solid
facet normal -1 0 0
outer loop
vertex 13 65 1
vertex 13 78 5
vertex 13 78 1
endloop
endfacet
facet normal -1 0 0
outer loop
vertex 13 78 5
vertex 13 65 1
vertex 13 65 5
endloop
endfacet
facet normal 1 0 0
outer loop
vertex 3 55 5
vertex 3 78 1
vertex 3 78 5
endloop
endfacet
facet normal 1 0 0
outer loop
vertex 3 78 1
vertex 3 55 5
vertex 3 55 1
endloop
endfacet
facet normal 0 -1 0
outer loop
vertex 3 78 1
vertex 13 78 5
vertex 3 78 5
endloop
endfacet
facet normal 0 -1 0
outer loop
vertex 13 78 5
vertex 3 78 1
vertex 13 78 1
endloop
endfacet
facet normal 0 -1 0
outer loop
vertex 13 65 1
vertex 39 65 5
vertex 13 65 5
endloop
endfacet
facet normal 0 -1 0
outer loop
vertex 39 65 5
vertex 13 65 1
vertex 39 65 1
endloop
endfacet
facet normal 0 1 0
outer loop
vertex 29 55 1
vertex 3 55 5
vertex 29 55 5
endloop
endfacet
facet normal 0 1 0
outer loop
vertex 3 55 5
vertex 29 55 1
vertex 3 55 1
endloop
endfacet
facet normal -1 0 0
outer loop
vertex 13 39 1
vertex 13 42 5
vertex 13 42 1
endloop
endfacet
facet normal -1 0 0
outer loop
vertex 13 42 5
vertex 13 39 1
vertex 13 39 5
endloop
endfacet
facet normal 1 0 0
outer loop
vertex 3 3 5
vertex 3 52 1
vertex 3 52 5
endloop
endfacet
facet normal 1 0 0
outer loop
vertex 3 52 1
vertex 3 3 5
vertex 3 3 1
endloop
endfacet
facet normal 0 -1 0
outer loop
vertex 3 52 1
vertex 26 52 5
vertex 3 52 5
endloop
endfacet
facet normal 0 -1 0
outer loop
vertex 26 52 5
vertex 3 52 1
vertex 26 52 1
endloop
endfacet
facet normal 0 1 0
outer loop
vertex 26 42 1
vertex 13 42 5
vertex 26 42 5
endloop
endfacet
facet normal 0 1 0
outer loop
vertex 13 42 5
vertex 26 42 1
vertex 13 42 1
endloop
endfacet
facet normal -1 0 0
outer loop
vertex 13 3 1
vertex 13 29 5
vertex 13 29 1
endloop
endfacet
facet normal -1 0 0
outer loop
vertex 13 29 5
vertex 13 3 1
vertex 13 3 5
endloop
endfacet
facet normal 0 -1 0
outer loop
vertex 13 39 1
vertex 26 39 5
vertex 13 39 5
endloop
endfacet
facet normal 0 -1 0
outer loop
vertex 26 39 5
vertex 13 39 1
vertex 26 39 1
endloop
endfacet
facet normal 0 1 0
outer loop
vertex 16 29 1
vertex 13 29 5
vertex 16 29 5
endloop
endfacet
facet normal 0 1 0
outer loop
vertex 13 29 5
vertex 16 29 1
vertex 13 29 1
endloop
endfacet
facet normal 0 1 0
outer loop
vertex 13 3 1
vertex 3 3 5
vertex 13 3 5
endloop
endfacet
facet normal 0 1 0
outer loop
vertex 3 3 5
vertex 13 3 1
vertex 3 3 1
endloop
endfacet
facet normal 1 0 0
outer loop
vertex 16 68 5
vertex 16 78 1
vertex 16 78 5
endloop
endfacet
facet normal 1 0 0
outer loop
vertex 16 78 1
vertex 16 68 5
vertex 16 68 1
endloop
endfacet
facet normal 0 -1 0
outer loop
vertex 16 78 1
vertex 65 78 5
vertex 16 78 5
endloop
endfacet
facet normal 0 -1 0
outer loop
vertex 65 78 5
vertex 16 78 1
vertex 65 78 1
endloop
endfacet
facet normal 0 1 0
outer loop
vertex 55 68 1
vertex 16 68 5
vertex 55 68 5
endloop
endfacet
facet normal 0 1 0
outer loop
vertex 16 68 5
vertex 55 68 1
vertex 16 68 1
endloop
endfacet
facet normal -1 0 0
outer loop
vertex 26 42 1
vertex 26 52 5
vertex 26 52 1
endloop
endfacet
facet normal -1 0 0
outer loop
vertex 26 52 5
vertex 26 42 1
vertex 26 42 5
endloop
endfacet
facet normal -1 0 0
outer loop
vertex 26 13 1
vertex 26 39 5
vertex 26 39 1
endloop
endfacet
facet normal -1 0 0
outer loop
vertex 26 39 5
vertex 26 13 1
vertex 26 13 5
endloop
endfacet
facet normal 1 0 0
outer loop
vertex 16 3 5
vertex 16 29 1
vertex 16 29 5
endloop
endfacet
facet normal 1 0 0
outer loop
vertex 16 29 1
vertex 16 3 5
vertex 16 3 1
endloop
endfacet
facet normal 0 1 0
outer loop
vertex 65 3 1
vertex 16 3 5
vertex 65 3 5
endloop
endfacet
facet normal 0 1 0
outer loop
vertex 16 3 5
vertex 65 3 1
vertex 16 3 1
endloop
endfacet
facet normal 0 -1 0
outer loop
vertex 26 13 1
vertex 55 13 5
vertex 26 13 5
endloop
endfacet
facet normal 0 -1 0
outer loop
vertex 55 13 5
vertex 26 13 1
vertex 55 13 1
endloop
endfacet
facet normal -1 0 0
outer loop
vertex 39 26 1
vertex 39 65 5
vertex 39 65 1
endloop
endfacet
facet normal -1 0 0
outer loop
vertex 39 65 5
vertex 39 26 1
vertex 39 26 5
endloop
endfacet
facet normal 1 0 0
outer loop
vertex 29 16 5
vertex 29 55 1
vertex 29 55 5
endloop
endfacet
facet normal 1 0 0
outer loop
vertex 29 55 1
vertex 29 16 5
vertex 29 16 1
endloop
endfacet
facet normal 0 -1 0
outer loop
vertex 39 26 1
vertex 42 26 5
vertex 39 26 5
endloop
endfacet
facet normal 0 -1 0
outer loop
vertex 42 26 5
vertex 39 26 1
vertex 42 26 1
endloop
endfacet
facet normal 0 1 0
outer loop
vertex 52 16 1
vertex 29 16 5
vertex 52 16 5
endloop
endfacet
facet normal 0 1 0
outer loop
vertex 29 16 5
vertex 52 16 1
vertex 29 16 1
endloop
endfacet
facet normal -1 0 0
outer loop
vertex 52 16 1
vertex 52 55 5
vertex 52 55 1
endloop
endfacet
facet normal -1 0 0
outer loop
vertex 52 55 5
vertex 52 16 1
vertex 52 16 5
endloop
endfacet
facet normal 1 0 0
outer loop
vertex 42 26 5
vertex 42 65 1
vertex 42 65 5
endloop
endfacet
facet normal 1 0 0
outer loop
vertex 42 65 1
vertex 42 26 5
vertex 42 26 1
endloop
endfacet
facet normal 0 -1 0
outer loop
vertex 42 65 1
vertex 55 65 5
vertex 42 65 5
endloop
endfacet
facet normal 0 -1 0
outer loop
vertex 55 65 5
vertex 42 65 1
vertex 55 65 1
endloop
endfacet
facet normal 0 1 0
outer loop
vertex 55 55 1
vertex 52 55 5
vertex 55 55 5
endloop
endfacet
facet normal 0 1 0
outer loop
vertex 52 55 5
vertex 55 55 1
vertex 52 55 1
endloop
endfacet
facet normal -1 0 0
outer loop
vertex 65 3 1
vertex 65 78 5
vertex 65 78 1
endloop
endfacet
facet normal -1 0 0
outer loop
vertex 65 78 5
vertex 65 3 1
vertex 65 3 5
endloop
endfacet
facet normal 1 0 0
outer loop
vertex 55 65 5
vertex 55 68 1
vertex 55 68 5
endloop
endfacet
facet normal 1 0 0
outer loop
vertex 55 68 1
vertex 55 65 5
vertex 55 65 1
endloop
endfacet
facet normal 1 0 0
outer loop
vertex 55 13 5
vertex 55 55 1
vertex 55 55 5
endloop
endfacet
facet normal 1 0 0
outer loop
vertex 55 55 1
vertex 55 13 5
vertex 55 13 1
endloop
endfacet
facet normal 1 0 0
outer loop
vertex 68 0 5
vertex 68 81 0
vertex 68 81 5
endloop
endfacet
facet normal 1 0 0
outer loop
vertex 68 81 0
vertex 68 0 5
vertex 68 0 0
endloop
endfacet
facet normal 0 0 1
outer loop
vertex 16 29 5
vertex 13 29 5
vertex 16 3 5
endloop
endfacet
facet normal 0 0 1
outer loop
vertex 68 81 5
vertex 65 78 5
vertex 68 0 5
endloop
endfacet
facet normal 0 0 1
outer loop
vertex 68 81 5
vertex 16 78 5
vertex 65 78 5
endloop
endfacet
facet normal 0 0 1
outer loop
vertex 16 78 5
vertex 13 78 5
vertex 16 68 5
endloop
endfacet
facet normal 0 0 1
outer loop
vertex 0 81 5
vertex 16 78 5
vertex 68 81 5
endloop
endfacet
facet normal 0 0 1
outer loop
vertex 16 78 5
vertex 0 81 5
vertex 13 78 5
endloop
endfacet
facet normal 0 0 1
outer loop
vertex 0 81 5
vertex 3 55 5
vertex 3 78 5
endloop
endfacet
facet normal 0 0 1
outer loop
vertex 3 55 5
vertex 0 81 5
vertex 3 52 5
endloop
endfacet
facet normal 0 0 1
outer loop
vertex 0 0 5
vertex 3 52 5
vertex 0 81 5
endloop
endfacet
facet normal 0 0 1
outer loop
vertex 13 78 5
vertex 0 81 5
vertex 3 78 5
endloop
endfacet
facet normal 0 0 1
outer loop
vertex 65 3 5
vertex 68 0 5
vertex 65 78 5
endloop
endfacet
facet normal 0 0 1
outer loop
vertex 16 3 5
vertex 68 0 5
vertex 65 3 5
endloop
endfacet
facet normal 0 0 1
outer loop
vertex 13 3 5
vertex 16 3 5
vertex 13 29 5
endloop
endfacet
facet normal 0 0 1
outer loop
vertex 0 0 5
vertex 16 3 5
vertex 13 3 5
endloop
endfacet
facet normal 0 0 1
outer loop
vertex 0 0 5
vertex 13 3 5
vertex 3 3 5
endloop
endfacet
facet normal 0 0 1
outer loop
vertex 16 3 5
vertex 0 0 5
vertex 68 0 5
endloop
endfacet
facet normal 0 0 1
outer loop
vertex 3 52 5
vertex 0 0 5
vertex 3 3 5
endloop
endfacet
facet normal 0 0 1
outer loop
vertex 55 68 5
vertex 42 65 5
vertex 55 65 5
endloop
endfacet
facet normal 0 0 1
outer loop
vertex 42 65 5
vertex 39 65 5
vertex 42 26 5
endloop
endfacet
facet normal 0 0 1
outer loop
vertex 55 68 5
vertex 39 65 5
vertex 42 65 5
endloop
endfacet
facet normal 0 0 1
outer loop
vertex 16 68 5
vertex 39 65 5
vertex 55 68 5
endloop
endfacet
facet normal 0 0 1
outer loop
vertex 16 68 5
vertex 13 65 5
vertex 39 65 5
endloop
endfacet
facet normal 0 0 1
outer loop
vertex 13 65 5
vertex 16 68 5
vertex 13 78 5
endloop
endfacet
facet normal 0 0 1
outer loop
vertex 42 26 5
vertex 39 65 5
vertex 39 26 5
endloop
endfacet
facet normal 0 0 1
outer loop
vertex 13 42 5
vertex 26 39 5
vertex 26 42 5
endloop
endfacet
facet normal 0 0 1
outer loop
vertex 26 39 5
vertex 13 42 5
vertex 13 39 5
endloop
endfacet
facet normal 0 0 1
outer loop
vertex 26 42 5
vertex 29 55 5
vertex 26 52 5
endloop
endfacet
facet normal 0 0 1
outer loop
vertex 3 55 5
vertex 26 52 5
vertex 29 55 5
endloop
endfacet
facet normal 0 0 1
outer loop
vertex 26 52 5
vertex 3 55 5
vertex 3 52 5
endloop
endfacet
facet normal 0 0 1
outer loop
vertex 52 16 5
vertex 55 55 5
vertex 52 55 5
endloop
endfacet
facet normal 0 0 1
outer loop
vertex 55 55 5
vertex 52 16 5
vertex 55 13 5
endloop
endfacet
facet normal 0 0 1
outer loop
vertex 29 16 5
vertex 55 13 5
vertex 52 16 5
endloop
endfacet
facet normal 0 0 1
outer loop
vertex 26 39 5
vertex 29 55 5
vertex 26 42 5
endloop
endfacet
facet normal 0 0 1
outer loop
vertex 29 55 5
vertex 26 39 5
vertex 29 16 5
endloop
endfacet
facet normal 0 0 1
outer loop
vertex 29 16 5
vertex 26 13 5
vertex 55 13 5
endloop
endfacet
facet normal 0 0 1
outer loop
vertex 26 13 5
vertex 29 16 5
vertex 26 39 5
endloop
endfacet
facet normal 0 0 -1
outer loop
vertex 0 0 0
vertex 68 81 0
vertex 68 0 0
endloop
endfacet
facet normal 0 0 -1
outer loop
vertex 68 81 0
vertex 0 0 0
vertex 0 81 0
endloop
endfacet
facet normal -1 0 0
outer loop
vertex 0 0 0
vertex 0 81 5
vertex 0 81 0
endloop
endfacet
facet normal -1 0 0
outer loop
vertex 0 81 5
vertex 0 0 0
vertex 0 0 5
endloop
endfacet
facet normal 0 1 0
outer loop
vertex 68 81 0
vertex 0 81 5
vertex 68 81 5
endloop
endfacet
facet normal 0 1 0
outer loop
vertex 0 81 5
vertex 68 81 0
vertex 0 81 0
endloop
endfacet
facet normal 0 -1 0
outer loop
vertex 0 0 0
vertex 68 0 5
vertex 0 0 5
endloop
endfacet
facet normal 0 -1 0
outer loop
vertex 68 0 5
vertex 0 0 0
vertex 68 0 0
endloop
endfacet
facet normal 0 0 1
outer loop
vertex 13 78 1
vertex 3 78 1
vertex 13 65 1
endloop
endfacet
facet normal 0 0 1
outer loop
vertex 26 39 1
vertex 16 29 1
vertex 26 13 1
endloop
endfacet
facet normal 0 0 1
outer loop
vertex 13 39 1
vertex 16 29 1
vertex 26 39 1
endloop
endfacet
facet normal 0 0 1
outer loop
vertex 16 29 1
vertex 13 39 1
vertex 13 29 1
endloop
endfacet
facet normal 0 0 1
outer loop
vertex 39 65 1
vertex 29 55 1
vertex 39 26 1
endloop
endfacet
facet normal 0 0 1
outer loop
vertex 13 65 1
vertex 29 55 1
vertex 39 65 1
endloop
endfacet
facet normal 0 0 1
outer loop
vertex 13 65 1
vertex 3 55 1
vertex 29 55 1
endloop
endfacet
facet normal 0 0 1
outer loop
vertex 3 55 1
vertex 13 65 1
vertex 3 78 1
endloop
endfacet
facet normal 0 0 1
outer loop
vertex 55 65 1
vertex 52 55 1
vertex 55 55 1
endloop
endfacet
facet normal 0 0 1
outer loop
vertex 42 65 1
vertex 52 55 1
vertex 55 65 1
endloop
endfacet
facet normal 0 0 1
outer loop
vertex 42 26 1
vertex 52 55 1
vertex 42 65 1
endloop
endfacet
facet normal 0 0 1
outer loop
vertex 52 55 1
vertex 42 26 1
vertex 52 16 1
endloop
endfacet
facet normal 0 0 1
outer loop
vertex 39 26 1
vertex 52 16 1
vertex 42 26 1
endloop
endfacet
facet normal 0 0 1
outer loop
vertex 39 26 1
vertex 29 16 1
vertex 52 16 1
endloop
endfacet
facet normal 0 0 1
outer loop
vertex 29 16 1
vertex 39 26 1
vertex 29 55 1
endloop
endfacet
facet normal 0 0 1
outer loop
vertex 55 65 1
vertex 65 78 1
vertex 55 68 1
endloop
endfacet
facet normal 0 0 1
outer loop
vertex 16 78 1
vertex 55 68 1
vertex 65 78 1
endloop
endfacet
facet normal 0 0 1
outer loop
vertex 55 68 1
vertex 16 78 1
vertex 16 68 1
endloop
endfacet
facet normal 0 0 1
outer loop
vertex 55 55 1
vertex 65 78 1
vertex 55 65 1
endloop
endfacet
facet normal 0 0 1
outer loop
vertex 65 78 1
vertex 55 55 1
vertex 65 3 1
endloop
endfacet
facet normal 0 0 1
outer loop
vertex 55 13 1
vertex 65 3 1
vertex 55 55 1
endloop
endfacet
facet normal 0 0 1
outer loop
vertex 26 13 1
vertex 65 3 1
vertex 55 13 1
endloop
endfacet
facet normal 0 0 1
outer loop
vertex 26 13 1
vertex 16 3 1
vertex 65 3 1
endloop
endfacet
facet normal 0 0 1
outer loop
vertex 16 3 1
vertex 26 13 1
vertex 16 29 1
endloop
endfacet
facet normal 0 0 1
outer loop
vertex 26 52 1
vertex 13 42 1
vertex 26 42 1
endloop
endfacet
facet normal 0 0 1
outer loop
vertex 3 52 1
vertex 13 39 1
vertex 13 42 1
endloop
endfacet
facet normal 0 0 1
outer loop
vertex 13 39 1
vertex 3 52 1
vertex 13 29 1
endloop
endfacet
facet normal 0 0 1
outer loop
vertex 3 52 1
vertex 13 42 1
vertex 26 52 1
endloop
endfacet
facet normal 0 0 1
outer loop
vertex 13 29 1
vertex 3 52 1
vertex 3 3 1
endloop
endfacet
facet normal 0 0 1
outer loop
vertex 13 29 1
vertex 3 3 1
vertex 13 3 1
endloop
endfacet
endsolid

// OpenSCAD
// file: demo/demo-maze-data.scad
// code generated maze data
columns = 5;
rows = 6;
connections = [
//  [r,c,S,E]
// S = 0, cut South Wall
// E = 0, cut East Wall
// Column: 0;
	[0,0,0,1],
	[1,0,1,0],
	[2,0,0,0],
	[3,0,0,0],
	[4,0,0,1],
	[5,0,1,1],
// Column: 1;
	[0,1,1,0],
	[1,1,1,0],
	[2,1,1,1],
	[3,1,0,1],
	[4,1,0,1],
	[5,1,1,0],
// Column: 2;
	[0,2,1,0],
	[1,2,0,1],
	[2,2,0,1],
	[3,2,0,1],
	[4,2,1,0],
	[5,2,1,0],
// Column: 3;
	[0,3,1,0],
	[1,3,0,0],
	[2,3,0,1],
	[3,3,0,1],
	[4,3,1,1],
	[5,3,1,0],
// Column: 4;
	[0,4,0,1],
	[1,4,0,1],
	[2,4,0,1],
	[3,4,0,1],
	[4,4,0,1],
	[5,4,1,1]
];
// main file
// Author: Mitch Allen
// File: maze.scad

// include <maze-data.scad>
include <demo/demo-maze-data.scad>

cellSize = 10;
wallSize = 3;
wallCutPadding = 1; // so sliver not left behind when wall cut out
panelSize = cellSize + wallSize;

mazePanelWidth = columns * panelSize + wallSize;
mazePanelHeight = rows * panelSize + wallSize;
mazePanelThickness = 5;
mazeFloorThickness = 1;
// Wall height needs to be large enough to not leave sliver 
// at bottom when cut out
wallHeight = mazePanelThickness * 2;
// Put 25% below zero so it completely goes through panel bottom
wallHeightOffset = 0 - wallHeight / 4;

floorColor = [0,1,0];
wallColor = [0,0,0];

module drawMazePanel() {
    color(wallColor) 
        cube(size = [mazePanelWidth,mazePanelHeight,mazePanelThickness]);
}

module drawMazeFloor() {
    color(floorColor) 
        cube(size = [mazePanelWidth,mazePanelHeight,mazeFloorThickness]);
}

module cutWalls() {
    // subtract cube cells
    for(el = [0:len(connections)-1]) {
        cell = connections[el];
        echo("CELL: ", cell);
        x = cell[0];
        y = cell[1];
        southWall = cell[2];
        eastWall = cell[3];
        
        cx = mazePanelHeight - (panelSize * (x+1));
        cy = wallSize + panelSize * y;
        
        tx = [ cy, cx, wallHeightOffset ];
        translate( tx ) cube( size = [cellSize, cellSize, wallHeight] );
        
        if( southWall == 0) {
            
            // cut south wall
            
            tx = [
                cy, 
                cx - wallCutPadding * 4, 
                wallHeightOffset ];
            
            translate( tx ) cube( size = [
                cellSize, wallSize + wallCutPadding * 2, wallHeight] );
        }
       
        if( eastWall == 0 ) {
            
            // cut east wall
            
            tx = [
                cy + cellSize  - wallCutPadding, 
                cx, 
                wallHeightOffset ];

            translate( tx ) cube( size = [
                wallSize + wallCutPadding * 2, cellSize, wallHeight] );
        }
    }
}

module main() {
    union() {
        difference() {
            drawMazePanel();
            cutWalls();
        }
        drawMazeFloor();
    }
}

main();
